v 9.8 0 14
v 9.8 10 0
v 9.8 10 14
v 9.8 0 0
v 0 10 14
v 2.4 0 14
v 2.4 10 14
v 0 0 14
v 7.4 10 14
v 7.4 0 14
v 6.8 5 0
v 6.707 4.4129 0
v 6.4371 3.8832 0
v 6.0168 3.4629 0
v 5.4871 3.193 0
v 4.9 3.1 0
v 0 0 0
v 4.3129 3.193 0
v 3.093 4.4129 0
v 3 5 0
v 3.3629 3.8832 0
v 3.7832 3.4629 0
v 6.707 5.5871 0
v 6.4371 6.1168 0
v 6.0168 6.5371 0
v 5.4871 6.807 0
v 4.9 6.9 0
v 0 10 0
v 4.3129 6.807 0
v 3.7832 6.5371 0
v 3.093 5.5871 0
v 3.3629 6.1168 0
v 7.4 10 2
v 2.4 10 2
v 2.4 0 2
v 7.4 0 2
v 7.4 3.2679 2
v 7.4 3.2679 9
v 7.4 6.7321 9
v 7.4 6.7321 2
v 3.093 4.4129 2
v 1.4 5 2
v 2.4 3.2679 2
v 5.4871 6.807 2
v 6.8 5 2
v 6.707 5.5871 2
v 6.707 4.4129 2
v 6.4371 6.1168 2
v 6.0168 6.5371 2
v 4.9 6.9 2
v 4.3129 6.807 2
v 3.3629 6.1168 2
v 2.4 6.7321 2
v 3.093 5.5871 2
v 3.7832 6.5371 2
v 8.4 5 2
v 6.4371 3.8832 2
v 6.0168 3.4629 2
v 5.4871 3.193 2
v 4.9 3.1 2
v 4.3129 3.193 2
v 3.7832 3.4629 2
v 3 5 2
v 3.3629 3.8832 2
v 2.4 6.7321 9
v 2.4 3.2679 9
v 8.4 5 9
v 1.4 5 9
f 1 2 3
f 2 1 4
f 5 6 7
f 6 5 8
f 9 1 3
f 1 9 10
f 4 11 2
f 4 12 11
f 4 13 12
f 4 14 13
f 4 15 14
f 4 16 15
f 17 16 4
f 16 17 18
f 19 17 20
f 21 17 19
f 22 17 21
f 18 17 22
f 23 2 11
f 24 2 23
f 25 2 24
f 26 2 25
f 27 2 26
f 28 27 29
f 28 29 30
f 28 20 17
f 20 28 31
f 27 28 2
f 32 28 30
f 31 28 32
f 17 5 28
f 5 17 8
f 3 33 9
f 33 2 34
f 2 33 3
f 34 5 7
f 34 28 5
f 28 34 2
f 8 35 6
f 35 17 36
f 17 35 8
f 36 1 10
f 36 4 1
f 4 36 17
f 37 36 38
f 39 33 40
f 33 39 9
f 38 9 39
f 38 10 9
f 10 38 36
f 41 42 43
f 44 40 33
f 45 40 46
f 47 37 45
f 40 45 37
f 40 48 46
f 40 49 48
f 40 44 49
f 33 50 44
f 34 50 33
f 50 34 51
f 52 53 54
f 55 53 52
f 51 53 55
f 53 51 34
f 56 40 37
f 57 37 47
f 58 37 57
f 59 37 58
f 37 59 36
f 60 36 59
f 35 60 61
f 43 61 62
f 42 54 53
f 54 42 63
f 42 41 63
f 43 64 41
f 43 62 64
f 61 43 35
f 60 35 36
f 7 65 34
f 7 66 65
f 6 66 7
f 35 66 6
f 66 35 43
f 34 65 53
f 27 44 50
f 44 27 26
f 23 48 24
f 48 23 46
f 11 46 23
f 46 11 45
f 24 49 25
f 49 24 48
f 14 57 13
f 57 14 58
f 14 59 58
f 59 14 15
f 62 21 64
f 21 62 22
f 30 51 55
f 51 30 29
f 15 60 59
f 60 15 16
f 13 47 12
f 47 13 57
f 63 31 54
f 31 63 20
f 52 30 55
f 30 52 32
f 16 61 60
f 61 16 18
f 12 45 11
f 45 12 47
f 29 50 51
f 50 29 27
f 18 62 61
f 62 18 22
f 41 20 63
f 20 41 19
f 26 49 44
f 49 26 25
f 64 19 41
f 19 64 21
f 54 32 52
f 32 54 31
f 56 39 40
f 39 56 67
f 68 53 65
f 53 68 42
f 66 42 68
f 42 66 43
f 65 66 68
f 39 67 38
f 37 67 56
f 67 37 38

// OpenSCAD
card_bracket_10();
//card_bracket_15();


module card_bracket_10(){

difference() {

cube([9.8,10,14]);

translate([2.4,-0.5,2]) cube([5,11,14]);

//translate([0,0,8]) cube([8.8,2,14]);

translate([4.9,5,0]) cylinder(r=1.9, h=15, $fn=20);

translate([4.9,5,2]) cylinder(r=3.5, h=7, $fn=6);

}

}

module card_bracket_15(){

difference() {

cube([9.8,15,14]);

translate([2.4,-0.5,2]) cube([5,16,14]);

//translate([0,0,8]) cube([8.8,2,14]);

translate([4.9,7.5,0]) cylinder(r=1.9, h=15, $fn=20);

translate([4.9,7.5,2]) cylinder(r=3.5, h=7, $fn=6);

}

}
